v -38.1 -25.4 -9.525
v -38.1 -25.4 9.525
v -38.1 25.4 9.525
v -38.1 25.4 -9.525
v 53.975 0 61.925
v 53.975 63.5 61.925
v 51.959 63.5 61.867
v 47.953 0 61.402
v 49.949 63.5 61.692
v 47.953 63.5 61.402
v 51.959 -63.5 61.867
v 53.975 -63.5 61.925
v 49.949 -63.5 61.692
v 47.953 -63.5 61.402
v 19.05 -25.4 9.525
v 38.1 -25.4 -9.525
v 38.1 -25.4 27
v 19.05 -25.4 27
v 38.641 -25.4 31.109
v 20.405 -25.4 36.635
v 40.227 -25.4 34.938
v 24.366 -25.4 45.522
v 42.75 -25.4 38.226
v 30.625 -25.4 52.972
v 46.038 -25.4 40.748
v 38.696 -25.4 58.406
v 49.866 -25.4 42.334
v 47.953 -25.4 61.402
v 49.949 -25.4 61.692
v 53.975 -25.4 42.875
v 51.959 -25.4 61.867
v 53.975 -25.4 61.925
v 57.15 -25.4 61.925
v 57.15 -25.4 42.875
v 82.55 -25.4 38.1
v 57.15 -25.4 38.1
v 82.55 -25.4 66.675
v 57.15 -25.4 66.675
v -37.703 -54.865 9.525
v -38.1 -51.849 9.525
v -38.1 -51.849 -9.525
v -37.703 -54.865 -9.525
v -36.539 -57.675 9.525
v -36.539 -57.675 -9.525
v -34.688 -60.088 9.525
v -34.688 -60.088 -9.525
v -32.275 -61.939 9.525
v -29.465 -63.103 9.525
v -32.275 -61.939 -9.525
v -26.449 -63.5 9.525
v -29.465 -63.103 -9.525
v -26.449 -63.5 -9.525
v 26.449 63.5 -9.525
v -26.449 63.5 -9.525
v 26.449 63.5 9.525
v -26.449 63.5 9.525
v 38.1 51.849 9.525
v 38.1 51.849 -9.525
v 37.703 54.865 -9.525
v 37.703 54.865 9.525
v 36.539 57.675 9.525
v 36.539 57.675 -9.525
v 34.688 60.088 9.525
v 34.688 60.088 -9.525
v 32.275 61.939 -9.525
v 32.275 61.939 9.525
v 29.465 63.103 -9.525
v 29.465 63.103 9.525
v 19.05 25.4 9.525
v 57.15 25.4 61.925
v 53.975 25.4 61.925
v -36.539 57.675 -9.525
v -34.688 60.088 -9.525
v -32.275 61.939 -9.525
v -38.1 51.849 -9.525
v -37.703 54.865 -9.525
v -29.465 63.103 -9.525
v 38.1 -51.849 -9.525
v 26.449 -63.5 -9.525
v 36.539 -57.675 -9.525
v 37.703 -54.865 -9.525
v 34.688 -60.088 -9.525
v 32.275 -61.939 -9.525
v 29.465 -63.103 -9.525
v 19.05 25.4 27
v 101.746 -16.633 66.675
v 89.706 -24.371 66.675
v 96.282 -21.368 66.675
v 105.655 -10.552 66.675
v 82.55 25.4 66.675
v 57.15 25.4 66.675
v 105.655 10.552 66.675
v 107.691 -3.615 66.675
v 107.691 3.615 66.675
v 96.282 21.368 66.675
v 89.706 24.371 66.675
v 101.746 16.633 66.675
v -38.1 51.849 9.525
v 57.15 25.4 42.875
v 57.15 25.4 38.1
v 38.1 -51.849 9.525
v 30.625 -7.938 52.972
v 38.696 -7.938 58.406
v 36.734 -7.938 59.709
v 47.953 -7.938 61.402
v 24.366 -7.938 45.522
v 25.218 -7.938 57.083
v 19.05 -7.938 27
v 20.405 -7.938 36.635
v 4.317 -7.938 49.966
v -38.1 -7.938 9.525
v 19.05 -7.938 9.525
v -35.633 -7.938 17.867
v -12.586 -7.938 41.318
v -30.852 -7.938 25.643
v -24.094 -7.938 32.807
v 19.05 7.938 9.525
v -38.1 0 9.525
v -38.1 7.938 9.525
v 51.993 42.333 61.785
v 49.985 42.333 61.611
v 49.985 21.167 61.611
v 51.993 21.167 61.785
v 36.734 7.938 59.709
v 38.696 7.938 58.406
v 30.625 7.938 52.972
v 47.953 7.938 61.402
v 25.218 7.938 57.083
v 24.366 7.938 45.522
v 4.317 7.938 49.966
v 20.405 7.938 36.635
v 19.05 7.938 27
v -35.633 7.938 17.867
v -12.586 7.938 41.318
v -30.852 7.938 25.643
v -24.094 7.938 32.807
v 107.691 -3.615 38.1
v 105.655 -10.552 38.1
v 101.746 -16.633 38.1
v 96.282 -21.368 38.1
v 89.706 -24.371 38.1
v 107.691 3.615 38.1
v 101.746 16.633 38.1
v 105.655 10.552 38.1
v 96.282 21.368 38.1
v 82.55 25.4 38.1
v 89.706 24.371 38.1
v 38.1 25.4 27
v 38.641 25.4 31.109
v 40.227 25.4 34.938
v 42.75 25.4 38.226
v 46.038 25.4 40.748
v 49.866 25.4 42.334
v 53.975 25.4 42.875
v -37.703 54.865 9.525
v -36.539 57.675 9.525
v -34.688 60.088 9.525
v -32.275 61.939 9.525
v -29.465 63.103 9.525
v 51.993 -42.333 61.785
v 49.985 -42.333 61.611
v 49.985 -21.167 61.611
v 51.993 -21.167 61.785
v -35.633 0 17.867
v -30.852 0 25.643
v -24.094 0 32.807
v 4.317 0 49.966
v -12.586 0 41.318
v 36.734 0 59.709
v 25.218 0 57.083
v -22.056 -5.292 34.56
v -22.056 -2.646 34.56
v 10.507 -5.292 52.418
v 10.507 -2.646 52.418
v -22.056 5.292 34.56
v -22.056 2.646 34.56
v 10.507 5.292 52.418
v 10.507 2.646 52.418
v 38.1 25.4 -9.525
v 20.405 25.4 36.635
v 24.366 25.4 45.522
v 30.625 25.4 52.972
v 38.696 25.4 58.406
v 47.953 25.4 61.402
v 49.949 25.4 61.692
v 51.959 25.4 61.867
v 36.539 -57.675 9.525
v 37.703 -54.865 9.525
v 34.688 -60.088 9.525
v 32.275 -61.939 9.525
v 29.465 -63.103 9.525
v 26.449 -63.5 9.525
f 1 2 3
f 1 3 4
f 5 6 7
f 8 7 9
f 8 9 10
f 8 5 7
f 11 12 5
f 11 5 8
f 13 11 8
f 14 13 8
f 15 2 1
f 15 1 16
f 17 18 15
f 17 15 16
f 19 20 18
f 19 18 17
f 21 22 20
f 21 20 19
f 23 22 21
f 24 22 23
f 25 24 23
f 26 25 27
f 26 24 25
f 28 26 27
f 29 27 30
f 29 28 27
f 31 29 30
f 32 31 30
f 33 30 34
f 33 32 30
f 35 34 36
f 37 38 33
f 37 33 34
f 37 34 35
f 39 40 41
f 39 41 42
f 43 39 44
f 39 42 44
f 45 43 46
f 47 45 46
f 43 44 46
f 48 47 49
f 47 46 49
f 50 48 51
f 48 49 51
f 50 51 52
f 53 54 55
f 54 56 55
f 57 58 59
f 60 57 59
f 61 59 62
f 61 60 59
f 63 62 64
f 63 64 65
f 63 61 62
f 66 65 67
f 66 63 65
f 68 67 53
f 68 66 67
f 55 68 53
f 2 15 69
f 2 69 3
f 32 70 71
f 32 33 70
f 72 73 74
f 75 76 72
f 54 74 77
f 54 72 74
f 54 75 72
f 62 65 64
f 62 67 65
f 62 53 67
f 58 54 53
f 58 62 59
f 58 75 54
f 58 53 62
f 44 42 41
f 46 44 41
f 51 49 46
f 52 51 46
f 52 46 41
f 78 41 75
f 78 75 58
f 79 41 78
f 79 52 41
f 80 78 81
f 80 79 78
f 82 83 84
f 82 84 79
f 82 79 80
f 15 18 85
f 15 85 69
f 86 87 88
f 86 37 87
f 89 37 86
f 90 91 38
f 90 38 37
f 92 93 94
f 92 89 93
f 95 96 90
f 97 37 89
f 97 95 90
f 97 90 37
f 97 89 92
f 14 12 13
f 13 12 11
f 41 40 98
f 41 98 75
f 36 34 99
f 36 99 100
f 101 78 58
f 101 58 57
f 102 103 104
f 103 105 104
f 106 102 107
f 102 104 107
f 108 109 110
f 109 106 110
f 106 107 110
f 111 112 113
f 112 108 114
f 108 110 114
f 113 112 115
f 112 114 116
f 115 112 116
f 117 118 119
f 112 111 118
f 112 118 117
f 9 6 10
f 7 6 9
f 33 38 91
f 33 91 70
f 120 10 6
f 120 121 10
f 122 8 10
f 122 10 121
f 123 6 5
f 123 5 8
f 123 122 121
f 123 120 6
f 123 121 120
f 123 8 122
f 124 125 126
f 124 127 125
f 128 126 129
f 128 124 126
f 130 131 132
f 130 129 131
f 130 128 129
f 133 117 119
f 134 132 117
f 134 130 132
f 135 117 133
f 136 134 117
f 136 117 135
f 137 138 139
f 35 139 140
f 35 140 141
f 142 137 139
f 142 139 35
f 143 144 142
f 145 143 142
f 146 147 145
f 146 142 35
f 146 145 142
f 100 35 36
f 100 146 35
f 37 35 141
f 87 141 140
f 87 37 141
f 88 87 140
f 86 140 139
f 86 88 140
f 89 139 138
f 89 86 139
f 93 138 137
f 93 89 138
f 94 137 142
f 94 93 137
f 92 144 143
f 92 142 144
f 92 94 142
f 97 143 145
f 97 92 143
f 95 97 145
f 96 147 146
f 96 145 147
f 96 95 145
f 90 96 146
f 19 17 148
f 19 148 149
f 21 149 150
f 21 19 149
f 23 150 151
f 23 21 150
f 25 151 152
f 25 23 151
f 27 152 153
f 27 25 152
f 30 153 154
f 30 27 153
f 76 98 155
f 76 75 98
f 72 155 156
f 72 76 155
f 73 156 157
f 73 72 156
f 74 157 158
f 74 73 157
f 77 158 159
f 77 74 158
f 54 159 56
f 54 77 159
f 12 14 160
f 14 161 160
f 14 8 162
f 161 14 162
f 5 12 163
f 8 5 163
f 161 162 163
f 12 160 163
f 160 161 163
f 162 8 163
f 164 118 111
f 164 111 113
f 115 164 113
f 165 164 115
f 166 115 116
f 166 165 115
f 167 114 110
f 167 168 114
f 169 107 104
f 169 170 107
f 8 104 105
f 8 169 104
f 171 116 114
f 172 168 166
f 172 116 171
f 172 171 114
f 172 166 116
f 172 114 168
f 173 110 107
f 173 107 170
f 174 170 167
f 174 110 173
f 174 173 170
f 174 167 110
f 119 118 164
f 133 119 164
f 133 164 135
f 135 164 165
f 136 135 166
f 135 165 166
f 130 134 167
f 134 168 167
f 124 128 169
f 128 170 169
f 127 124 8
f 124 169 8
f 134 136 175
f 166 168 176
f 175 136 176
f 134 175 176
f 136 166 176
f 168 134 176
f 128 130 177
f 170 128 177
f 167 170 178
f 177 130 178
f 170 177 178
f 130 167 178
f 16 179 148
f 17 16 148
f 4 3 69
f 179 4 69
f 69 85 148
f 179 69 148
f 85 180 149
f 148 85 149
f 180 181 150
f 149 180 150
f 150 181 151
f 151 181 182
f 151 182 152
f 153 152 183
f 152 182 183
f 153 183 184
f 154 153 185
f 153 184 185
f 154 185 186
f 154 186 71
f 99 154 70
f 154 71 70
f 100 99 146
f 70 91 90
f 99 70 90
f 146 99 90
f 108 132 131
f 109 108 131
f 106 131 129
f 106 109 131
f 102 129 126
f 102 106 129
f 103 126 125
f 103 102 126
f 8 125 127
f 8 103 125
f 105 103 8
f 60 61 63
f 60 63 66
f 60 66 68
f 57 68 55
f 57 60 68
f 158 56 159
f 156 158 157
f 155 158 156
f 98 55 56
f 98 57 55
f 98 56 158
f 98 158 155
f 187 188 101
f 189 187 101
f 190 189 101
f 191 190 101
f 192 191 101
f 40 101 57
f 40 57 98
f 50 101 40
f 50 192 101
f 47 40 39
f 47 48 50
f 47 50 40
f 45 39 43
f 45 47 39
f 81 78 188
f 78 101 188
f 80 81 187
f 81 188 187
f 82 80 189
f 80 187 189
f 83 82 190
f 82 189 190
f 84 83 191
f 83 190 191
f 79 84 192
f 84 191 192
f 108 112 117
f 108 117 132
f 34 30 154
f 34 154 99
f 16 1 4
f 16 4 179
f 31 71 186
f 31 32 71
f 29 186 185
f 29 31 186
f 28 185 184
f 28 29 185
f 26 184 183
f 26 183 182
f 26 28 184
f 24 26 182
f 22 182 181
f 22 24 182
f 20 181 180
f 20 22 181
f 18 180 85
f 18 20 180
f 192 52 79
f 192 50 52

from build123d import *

# Parameters (mm, degrees)
F1_DEPTH = 63.5
F0_W     = 25.4
F0_H     = 4.7498
F0_H_2   = 4.7752
F0_H_3   = 19.05
F2_DEPTH = 25.4
F3_DEPTH = 7.9375
F4_R     = 11.650994652


with BuildPart() as f1:
    # F0 (on Front) → F1 (new body, symmetric)
    with BuildSketch(Plane.XZ):
        with BuildLine():
            ThreePointArc((53.975, 61.9252), (50.9526448085, 61.7941792794), (47.9529662758, 61.402100163))
            add(Edge.make_bspline(
                [(47.9529662758, 61.402100163), (49.9961253717, 61.6279866197), (52.0066591071, 61.8028182826), (53.975, 61.9252)],
                knots=[100.2528383357, 100.2528383357, 100.2528383357, 100.2528383357, 105.9414299745, 105.9414299745, 105.9414299745, 105.9414299745], degree=3))
        make_face()
    extrude(amount=F1_DEPTH, both=True)


with BuildPart() as f1b:
    # F0 (on Front) → F1, piece 2 (new body, symmetric)
    with BuildSketch(Plane.XZ):
        Polygon((19.05, 9.525), (-38.1, 9.525), (-38.1, -9.525), (38.1, -9.525), (38.1, 9.525), align=None)
    extrude(amount=F1_DEPTH, both=True)

    # F4
    f4_edges = [f1b.edges().sort_by_distance(p)[0] for p in [
        (-38.1, 63.5, 0),
        (38.1, 63.5, 0),
        (-38.1, -63.5, 0),
        (38.1, -63.5, 0),
    ]]
    fillet(f4_edges, radius=F4_R)


with BuildPart() as f2:
    # F0 (on Front) → F2 (new body, symmetric)
    with BuildSketch(Plane.XZ):
        with BuildLine():
            ThreePointArc((53.975, 61.9252), (50.9526448085, 61.7941792794), (47.9529662758, 61.402100163))
            add(Edge.make_bspline(
                [(47.9529662758, 61.402100163), (49.9961253717, 61.6279866197), (52.0066591071, 61.8028182826), (53.975, 61.9252)],
                knots=[100.2528383357, 100.2528383357, 100.2528383357, 100.2528383357, 105.9414299745, 105.9414299745, 105.9414299745, 105.9414299745], degree=3))
        make_face()
        Polygon((19.05, 9.525), (-38.1, 9.525), (-38.1, -9.525), (38.1, -9.525), (38.1, 9.525), align=None)
        with Locations((69.85, 64.3001)):
            Rectangle(F0_W, F0_H)
        with Locations((69.85, 40.4876)):
            Rectangle(F0_W, F0_H_2)
        with Locations((69.85, 52.4002)):
            Rectangle(F0_W, F0_H_3)
        with BuildLine():
            Line((19.05, 27.0002), (19.05, 9.525))
            Line((19.05, 9.525), (38.1, 9.525))
            Line((38.1, 9.525), (38.1, 27.0002))
            ThreePointArc((38.1, 27.0002), (42.7496798487, 38.2255201513), (53.975, 42.8752))
            Line((53.975, 42.8752), (57.15, 42.8752))
            Line((57.15, 42.8752), (57.15, 61.9252))
            Line((57.15, 61.9252), (53.975, 61.9252))
            add(Edge.make_bspline(
                [(47.9529662758, 61.402100163), (49.9961253717, 61.6279866197), (52.0066591071, 61.8028182826), (53.975, 61.9252)],
                knots=[100.2528383357, 100.2528383357, 100.2528383357, 100.2528383357, 105.9414299745, 105.9414299745, 105.9414299745, 105.9414299745], degree=3))
            ThreePointArc((47.9529662758, 61.402100163), (27.234813456, 49.4661308419), (19.05, 27.0002))
        make_face()
    extrude(amount=F2_DEPTH, both=True)

    # F0 (on Front) → F5 (revolve)
    with BuildSketch(Plane.XZ):
        Polygon((82.55, 66.675), (82.55, 61.9252), (82.55, 42.8752), (82.55, 38.1), (107.95, 38.1), (107.95, 66.675), align=None)
    revolve(axis=Axis((82.55, 0, 52.3875), (0, 0, 1)))


with BuildPart() as f3:
    # F0 (on Front) → F3 (new body, symmetric)
    with BuildSketch(Plane.XZ):
        with BuildLine():
            add(Edge.make_bspline(
                [(-38.1, 9.525), (-34.195247873, 37.5833089154), (11.9453722091, 57.4211924335), (47.9529662758, 61.402100163)],
                knots=[0, 0, 0, 0, 100.2528383357, 100.2528383357, 100.2528383357, 100.2528383357], degree=3))
            Line((-38.1, 9.525), (19.05, 9.525))
            Line((19.05, 9.525), (19.05, 27.0002))
            ThreePointArc((19.05, 27.0002), (27.234813456, 49.4661308419), (47.9529662758, 61.402100163))
        make_face()
    extrude(amount=F3_DEPTH, both=True)


solid = Compound([f1.part, f1b.part, f2.part, f3.part])
